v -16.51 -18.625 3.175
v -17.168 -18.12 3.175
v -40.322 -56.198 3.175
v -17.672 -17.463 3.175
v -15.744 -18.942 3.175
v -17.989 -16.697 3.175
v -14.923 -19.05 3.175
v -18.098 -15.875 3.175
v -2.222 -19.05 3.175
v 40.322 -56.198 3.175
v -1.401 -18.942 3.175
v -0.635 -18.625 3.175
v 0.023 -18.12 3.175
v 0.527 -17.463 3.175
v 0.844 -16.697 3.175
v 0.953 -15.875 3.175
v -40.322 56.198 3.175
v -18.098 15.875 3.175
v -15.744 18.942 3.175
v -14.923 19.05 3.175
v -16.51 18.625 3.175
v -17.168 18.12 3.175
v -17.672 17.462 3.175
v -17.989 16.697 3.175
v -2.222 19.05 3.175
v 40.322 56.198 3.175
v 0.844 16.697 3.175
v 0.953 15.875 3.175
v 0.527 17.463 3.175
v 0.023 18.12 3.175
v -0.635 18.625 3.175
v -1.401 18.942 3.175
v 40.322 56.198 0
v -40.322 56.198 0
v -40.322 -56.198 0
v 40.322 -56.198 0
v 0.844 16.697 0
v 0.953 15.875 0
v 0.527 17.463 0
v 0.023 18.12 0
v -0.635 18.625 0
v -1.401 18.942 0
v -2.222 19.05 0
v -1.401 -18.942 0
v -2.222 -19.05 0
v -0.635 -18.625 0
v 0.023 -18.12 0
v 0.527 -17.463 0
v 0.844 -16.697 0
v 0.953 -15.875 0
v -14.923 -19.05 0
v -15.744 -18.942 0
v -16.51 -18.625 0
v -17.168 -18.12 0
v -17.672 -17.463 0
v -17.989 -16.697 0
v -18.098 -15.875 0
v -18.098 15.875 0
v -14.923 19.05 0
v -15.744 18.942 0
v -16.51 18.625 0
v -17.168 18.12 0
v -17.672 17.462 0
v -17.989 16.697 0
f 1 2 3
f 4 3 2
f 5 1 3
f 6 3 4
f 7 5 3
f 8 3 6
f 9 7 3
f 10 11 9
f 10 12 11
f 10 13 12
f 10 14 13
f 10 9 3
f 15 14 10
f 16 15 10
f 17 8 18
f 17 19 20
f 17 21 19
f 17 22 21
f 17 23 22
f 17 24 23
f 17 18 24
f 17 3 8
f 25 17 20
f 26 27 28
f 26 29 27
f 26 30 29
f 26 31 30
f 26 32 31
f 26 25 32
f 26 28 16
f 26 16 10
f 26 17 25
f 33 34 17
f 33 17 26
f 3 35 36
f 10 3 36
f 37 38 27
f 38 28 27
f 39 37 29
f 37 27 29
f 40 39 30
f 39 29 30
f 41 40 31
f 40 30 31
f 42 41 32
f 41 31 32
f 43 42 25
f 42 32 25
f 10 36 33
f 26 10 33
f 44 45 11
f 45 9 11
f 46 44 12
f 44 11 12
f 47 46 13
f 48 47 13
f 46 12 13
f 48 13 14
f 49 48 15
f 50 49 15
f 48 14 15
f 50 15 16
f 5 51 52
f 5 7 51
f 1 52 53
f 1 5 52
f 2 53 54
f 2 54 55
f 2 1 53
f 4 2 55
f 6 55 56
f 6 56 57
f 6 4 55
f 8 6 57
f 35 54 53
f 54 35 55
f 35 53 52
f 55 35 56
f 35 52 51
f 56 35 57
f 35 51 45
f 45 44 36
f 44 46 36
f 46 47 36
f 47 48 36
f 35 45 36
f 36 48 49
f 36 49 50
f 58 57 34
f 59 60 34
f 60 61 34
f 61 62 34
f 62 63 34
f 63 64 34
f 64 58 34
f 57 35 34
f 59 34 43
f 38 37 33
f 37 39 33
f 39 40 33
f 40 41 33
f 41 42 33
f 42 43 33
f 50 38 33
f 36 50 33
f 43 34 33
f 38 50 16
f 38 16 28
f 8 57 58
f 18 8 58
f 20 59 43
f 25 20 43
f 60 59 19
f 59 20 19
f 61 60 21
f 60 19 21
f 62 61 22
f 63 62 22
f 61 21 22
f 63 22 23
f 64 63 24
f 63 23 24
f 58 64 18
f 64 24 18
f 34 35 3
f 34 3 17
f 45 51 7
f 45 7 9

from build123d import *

# Parameters (mm, degrees)
SKETCH1_W           = 80.645
SKETCH1_H           = 112.395
SKETCH1_W_2         = 19.05
SKETCH1_H_2         = 38.1
BOSS_EXTRUDE1_DEPTH = 3.175
FILLET1_R           = 3.175


with BuildPart() as part:
    # Sketch1 → Boss-Extrude1 (new body)
    with BuildSketch(Plane.XY):
        Rectangle(SKETCH1_W, SKETCH1_H)
        with Locations((-8.5725, 0)):
            Rectangle(SKETCH1_W_2, SKETCH1_H_2, mode=Mode.SUBTRACT)
    extrude(amount=BOSS_EXTRUDE1_DEPTH)

    # Fillet1
    fillet1_edges = [part.edges().sort_by_distance(p)[0] for p in [
        (-18.0975, -19.05, 1.5875),
        (0.9525, -19.05, 1.5875),
        (0.9525, 19.05, 1.5875),
        (-18.0975, 19.05, 1.5875),
    ]]
    fillet(fillet1_edges, radius=FILLET1_R)


solid = part.part
